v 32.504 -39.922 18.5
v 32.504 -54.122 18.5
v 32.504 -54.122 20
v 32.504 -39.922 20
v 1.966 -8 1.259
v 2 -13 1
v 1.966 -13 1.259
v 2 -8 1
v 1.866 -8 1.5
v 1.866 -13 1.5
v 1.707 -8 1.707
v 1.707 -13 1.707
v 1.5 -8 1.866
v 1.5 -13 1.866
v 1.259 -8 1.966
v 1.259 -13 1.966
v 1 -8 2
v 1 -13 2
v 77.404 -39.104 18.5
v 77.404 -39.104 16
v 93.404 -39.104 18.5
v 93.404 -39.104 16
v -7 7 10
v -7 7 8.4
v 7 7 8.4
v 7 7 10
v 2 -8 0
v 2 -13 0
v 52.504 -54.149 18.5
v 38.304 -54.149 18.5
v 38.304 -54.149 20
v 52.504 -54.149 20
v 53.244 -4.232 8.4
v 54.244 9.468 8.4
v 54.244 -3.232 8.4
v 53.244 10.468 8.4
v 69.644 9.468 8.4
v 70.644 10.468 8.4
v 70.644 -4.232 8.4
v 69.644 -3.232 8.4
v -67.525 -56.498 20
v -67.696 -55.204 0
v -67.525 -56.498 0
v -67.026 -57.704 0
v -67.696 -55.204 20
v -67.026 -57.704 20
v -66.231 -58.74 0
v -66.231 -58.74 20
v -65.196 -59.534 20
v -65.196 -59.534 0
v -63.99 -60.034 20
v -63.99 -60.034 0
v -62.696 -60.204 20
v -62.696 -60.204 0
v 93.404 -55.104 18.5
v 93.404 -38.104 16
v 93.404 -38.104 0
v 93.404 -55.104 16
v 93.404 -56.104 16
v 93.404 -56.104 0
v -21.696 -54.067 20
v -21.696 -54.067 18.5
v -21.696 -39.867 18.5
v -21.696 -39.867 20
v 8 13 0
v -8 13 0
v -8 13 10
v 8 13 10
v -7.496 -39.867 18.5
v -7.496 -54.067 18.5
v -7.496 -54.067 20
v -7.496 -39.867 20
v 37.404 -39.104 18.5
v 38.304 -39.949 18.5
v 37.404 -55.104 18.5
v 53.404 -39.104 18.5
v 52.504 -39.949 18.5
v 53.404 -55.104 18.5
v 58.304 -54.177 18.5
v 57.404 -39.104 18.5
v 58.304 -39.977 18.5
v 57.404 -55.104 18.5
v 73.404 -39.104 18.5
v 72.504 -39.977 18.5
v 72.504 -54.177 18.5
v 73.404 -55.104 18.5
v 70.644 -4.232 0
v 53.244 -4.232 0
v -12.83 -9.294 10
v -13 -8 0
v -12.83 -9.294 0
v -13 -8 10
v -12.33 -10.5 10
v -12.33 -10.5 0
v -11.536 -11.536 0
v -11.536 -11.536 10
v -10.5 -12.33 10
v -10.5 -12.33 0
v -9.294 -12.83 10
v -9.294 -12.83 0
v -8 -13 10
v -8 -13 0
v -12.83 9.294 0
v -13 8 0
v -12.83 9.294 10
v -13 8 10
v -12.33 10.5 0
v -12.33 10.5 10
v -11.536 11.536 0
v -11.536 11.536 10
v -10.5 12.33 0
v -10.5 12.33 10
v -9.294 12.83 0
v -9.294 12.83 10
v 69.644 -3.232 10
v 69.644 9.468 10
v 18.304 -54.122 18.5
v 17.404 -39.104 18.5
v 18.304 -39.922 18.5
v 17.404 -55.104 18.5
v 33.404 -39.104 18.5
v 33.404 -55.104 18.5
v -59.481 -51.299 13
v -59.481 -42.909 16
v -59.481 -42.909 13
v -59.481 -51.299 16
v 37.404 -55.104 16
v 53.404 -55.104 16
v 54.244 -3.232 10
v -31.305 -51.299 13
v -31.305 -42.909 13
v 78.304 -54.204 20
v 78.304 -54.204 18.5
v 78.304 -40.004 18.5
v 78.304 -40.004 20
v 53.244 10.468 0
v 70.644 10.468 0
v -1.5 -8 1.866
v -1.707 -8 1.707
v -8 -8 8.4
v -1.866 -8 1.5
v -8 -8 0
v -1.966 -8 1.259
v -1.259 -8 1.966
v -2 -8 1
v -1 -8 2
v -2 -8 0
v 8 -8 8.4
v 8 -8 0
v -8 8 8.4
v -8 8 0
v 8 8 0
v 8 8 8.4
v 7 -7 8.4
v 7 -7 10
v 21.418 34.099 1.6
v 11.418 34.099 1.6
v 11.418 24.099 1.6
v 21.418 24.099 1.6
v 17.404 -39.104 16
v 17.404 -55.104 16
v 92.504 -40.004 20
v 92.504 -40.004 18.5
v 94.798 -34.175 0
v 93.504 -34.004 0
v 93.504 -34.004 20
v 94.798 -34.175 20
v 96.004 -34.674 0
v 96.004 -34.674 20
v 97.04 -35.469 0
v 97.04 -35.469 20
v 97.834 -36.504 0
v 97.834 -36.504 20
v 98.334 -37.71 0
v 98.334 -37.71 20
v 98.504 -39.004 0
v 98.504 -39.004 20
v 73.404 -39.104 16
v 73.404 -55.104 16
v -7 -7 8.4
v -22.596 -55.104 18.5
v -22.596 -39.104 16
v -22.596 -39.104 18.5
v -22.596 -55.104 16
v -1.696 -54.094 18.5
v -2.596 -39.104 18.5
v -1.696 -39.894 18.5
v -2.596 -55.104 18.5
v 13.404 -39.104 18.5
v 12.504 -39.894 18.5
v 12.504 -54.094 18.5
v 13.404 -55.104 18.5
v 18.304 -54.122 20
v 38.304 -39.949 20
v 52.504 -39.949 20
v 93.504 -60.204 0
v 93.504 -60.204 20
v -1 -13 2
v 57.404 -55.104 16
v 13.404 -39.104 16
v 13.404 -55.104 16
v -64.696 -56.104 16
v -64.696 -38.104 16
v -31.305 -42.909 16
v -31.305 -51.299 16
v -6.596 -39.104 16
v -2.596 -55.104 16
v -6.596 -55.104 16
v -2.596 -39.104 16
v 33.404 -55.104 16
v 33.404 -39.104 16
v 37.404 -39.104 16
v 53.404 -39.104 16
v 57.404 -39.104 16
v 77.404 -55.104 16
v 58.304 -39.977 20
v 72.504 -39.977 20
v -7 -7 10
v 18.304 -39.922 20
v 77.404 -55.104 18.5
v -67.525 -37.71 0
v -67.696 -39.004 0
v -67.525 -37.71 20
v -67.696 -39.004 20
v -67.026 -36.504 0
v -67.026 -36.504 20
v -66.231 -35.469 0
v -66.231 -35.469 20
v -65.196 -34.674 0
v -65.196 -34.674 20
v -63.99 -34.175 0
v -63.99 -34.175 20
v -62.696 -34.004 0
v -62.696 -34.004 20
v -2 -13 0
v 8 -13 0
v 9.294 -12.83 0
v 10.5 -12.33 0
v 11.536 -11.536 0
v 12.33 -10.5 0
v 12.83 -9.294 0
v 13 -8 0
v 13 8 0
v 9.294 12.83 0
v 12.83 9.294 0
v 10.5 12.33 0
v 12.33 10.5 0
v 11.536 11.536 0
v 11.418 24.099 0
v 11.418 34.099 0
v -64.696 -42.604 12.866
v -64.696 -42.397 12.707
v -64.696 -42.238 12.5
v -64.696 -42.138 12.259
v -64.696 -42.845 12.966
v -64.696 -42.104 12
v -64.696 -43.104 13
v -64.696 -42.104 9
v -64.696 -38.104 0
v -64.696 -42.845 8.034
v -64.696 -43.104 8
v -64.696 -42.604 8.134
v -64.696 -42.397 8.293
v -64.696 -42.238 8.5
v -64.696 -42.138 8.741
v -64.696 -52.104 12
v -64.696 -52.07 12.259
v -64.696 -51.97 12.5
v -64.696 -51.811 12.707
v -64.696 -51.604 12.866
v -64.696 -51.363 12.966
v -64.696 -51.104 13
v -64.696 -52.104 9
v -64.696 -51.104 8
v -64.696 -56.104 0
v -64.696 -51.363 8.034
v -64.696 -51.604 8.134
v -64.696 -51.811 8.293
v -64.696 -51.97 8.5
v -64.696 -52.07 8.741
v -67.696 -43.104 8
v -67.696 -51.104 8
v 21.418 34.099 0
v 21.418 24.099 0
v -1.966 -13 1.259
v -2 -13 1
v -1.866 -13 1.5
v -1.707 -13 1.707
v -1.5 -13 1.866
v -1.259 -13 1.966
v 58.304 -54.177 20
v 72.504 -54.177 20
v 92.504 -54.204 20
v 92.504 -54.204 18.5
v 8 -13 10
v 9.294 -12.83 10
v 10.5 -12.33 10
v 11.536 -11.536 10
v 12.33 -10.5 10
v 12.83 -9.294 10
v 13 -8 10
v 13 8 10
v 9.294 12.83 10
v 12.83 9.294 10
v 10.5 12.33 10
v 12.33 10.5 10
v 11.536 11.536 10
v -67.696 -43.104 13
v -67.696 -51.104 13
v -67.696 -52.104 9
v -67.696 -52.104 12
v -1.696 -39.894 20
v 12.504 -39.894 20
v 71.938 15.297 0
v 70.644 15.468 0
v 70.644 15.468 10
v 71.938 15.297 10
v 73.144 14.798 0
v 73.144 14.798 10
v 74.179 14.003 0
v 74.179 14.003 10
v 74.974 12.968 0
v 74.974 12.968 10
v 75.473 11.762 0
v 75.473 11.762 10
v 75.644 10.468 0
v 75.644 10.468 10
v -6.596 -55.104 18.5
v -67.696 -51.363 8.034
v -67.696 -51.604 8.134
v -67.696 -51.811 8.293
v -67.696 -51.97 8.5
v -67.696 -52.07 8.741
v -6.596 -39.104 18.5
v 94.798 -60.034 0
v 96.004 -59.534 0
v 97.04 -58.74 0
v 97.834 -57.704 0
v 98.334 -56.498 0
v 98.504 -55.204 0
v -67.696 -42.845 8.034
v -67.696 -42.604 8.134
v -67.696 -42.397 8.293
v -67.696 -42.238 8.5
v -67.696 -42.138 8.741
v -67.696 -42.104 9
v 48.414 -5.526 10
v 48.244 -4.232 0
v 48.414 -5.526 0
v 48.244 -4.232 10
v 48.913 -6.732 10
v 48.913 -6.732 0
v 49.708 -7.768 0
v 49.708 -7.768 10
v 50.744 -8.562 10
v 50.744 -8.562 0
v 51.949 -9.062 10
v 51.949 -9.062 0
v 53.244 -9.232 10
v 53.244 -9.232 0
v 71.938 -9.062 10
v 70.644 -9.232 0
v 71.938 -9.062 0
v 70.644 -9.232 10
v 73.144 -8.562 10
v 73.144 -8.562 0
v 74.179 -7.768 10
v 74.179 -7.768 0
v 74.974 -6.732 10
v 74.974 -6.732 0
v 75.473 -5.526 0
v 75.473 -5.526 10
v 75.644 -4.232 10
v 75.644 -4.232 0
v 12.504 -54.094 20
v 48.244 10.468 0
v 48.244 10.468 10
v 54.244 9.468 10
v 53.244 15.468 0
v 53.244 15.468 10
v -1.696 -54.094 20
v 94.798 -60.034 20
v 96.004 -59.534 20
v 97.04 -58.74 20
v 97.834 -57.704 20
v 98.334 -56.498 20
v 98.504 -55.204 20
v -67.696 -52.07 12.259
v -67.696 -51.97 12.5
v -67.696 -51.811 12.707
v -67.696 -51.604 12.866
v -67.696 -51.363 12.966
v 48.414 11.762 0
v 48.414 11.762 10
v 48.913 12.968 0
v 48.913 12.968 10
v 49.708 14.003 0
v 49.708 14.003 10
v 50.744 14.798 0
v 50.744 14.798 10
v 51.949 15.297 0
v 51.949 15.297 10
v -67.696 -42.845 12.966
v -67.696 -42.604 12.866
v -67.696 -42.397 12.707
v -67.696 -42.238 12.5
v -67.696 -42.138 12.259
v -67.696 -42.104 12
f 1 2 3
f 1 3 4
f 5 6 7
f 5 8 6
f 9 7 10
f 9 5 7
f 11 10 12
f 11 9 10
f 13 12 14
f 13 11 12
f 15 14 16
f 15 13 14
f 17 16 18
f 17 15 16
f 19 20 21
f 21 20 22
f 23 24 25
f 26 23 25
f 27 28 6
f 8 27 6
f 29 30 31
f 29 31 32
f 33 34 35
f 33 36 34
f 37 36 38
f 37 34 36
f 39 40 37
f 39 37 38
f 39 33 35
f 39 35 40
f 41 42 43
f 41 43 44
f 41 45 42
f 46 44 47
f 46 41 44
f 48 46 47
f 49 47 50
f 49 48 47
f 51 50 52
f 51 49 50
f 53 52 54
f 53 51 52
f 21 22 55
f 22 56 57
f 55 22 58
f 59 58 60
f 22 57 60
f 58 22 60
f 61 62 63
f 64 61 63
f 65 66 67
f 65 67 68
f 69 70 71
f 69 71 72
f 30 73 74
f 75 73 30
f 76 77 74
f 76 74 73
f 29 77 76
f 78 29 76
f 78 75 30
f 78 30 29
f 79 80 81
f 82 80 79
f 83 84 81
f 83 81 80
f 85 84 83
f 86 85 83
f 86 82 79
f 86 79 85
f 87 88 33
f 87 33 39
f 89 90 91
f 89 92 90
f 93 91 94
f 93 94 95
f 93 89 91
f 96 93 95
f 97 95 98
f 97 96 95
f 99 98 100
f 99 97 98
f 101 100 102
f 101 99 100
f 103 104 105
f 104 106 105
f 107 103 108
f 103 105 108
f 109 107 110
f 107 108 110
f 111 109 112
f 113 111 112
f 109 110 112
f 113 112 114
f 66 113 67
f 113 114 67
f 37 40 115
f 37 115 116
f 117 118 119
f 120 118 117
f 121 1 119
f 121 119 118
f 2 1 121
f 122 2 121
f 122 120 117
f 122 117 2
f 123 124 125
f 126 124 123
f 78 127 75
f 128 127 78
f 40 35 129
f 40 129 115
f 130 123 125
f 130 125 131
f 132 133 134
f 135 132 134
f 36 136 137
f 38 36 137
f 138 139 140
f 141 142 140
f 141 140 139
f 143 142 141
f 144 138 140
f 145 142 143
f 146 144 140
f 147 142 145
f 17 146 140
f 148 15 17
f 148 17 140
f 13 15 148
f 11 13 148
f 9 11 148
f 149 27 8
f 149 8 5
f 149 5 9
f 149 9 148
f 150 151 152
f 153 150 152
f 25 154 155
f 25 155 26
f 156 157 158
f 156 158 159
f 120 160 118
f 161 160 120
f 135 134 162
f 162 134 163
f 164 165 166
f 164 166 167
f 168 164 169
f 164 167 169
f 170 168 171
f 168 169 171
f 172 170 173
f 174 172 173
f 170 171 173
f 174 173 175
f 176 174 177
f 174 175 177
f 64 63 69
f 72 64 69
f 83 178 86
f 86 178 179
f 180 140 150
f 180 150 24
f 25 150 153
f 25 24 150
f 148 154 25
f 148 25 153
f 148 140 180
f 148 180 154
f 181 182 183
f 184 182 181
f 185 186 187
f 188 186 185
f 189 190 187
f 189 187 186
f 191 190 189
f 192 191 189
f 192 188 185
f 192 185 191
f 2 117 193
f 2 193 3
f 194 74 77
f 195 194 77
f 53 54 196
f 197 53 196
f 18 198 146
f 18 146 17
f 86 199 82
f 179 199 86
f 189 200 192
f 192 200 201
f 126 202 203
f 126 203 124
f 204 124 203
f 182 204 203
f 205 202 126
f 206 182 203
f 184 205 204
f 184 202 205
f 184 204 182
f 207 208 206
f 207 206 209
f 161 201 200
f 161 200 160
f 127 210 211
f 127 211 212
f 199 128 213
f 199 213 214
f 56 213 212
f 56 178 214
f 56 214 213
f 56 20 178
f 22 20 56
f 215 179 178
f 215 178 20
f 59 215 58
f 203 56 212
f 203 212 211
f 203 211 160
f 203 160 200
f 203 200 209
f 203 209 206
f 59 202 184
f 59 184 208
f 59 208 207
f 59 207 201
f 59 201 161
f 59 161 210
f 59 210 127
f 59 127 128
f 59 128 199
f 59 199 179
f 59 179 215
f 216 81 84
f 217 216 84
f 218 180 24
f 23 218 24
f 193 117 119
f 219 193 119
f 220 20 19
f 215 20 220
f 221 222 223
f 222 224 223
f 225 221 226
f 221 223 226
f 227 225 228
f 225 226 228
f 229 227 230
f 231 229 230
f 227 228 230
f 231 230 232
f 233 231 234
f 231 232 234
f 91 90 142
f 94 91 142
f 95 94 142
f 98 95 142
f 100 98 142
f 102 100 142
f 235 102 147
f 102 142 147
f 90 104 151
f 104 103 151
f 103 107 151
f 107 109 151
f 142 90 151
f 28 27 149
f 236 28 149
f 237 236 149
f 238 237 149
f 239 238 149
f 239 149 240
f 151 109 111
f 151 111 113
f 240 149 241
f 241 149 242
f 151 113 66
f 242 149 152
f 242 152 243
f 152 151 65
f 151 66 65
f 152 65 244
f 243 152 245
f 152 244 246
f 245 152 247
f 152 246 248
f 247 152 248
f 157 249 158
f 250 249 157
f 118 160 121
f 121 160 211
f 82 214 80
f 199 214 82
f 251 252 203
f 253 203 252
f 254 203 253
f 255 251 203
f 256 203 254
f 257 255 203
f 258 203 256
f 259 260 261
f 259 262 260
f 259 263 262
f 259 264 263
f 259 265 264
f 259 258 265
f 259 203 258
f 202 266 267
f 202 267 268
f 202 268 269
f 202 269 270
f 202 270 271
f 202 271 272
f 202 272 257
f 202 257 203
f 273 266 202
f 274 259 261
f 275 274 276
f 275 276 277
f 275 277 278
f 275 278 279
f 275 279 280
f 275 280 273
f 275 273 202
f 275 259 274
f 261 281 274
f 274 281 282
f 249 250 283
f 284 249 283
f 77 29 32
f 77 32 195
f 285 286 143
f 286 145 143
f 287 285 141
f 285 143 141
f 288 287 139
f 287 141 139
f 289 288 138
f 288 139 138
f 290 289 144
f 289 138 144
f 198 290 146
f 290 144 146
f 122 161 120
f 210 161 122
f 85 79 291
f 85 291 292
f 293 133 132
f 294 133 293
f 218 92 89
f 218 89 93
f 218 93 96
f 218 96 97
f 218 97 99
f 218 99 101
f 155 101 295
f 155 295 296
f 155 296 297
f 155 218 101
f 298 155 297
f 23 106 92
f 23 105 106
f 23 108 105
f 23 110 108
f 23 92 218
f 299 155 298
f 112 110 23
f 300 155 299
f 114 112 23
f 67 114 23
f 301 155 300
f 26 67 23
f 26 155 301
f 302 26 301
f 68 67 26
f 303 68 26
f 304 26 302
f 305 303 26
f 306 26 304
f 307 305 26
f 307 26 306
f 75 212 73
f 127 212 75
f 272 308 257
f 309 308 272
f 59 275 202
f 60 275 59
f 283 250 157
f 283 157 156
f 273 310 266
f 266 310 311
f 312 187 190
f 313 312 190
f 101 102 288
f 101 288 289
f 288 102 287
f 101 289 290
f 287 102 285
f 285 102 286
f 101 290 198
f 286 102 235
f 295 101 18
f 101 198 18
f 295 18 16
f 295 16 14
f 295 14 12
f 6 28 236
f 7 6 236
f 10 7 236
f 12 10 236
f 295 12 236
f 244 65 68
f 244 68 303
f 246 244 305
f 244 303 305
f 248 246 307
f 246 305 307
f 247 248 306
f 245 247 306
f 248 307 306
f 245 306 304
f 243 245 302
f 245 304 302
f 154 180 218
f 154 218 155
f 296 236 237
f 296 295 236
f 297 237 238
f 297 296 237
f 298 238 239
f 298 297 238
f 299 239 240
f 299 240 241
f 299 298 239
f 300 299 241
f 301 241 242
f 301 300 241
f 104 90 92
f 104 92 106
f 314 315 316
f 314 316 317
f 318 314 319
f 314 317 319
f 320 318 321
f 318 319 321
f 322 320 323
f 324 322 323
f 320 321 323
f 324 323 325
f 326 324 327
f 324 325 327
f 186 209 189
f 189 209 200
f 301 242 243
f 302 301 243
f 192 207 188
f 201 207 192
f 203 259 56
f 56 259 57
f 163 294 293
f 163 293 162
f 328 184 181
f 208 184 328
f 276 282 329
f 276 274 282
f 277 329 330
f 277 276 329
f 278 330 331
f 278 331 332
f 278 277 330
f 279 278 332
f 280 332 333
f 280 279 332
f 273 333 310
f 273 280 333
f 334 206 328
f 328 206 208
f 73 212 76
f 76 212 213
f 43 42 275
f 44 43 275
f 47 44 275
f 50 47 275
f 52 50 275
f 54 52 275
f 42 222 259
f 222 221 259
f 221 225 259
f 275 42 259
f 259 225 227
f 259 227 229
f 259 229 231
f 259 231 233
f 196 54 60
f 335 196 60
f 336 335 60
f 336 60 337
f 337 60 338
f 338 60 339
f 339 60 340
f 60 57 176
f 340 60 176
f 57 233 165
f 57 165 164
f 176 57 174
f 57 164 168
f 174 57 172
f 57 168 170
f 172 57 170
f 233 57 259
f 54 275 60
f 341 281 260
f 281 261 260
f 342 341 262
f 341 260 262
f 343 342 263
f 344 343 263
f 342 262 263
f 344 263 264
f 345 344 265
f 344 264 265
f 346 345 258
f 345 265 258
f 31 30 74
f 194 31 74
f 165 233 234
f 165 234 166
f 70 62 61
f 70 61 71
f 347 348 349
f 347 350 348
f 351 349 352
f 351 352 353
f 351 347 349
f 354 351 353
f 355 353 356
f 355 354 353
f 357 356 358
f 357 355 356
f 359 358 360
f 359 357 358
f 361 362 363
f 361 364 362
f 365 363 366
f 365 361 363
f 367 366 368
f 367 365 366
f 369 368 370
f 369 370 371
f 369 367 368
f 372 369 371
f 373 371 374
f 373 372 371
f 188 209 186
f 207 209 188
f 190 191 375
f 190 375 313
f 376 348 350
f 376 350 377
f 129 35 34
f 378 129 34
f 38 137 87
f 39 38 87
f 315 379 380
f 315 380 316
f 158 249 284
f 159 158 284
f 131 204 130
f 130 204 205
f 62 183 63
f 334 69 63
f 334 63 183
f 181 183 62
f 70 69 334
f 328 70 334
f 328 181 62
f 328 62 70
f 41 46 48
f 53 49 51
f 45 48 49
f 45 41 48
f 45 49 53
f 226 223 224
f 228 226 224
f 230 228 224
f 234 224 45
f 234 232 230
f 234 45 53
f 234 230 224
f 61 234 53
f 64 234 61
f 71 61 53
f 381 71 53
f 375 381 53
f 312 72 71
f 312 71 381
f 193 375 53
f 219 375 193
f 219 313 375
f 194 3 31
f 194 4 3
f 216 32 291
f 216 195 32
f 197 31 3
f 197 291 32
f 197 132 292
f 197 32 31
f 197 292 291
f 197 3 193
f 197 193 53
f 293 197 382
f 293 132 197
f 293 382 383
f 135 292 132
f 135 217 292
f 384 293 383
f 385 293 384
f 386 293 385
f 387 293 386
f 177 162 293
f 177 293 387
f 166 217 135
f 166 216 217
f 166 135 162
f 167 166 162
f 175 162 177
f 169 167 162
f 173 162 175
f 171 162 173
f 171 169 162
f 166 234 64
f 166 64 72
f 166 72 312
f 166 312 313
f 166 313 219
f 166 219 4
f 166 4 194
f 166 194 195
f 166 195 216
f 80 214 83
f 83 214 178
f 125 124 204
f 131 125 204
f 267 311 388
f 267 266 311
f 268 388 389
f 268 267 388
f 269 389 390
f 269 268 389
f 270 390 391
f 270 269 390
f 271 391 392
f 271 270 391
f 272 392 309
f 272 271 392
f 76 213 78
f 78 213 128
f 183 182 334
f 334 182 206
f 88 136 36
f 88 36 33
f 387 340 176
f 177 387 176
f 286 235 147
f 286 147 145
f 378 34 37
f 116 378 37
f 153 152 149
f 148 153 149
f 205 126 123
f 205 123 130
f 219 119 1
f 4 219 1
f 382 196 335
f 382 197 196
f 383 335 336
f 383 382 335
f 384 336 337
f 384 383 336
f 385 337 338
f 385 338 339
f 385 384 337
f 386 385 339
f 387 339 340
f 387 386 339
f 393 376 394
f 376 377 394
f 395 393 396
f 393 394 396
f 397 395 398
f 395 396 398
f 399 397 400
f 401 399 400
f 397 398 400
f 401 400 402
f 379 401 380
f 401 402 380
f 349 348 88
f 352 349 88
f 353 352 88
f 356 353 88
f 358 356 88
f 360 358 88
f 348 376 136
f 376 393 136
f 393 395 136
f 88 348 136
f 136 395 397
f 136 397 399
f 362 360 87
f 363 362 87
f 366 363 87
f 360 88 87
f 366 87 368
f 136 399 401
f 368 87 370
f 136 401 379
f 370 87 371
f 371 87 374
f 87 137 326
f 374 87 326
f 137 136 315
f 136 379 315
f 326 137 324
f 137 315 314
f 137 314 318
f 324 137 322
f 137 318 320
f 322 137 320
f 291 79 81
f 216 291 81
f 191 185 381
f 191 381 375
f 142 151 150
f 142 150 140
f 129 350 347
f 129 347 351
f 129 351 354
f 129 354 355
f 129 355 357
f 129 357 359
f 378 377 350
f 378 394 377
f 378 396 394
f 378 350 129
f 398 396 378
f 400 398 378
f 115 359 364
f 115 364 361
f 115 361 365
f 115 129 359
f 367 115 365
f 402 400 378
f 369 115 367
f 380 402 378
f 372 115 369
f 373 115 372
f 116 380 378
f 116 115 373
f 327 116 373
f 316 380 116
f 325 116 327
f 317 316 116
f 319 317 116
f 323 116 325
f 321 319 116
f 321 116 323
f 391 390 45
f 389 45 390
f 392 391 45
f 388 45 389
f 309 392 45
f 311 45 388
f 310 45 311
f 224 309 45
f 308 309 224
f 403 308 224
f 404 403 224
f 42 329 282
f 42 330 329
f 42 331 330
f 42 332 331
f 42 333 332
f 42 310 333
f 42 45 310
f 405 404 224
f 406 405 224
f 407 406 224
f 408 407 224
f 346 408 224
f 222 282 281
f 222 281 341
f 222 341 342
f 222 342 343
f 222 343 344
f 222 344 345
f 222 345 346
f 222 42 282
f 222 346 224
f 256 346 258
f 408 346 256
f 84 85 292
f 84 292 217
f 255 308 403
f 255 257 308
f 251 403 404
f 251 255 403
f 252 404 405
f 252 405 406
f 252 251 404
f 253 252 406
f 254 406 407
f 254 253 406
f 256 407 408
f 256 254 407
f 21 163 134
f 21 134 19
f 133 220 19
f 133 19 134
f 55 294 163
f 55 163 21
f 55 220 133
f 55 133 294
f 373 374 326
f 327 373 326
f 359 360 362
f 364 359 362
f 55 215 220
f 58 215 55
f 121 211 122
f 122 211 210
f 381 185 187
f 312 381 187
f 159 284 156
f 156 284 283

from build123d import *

# Parameters (mm, degrees)
F0_W      = 26
F0_H      = 26
F0_W_2    = 14
F0_H_2    = 14
F0_W_3    = 27.4
F0_H_3    = 24.7
F0_W_4    = 15.4
F0_H_4    = 12.7
F1_DEPTH  = 10
F2_W      = 16
F2_H      = 16
F2_W_2    = 17.4
F2_H_2    = 14.7
F3_DEPTH  = 8.4
F4_W      = 4
F4_H      = 4
F5_DEPTH  = 5
F6_W      = 166.199906
F6_H      = 26.2
F6_W_2    = 14.2
F6_H_2    = 14.2
F7_DEPTH  = 20
F8_W      = 16
F8_H      = 16
F9_DEPTH  = 18.5
F10_W     = 158.099906
F10_H     = 18
F11_DEPTH = 16
F12_W     = 28.1763
F12_H     = 8.38993
F13_DEPTH = 3
F14_W     = 10
F14_H     = 5
F15_DEPTH = 3
F16_R     = 5
F16_2_R   = 5
F17_R     = 1
F17_2_R   = 1
F18_W     = 10
F18_H     = 10
F19_DEPTH = 1.6


with BuildPart() as f1:
    # F0 (on Top) → F1 (new body)
    with BuildSketch(Plane.XY):
        Rectangle(F0_W, F0_H)
        Rectangle(F0_W_2, F0_H_2, mode=Mode.SUBTRACT)
        with Locations((61.943563, 3.11776)):
            Rectangle(F0_W_3, F0_H_3)
        with Locations((61.943563, 3.11776)):
            Rectangle(F0_W_4, F0_H_4, mode=Mode.SUBTRACT)
    extrude(amount=F1_DEPTH)

    # F2 (on face) → F3 (cut)
    with BuildSketch(Plane(origin=(0, 0, 0), x_dir=(1, 0, 0), z_dir=(0, 0, -1))):
        Rectangle(F2_W, F2_H)
        with Locations((61.943563, -3.11776)):
            Rectangle(F2_W_2, F2_H_2)
    extrude(amount=-F3_DEPTH, mode=Mode.SUBTRACT)

    # F4 (on face) → F5 (cut, through all)
    with BuildSketch(Plane.XZ.offset(13)):
        Rectangle(F4_W, F4_H)
    extrude(amount=-F5_DEPTH, mode=Mode.SUBTRACT)

    # F16
    f16_edges = [f1.edges().sort_by_distance(p)[0] for p in [
        (-13, -13, 5),
        (-13, 13, 5),
        (13, -13, 5),
        (13, 13, 5),
        (75.643563, 15.46776, 5),
        (75.643563, -9.23224, 5),
        (48.243563, -9.23224, 5),
        (48.243563, 15.46776, 5),
    ]]
    fillet(f16_edges, radius=F16_R)

    # F17
    f17_edges = [f1.edges().sort_by_distance(p)[0] for p in [
        (-2, -10.5, 2),
        (2, -10.5, 2),
    ]]
    fillet(f17_edges, radius=F17_R)


with BuildPart() as f7:
    # F6 (on Top) → F7 (new body)
    with BuildSketch(Plane.XY):
        with Locations((15.404408, -47.104196)):
            Rectangle(F6_W, F6_H)
        with Locations((-14.595545, -46.966988)):
            Rectangle(F6_W_2, F6_H_2, mode=Mode.SUBTRACT)
        with Locations((5.404436, -46.99443)):
            Rectangle(F6_W_2, F6_H_2, mode=Mode.SUBTRACT)
        with Locations((25.404418, -47.021871)):
            Rectangle(F6_W_2, F6_H_2, mode=Mode.SUBTRACT)
        with Locations((45.404399, -47.049313)):
            Rectangle(F6_W_2, F6_H_2, mode=Mode.SUBTRACT)
        with Locations((65.40438, -47.076754)):
            Rectangle(F6_W_2, F6_H_2, mode=Mode.SUBTRACT)
        with Locations((85.404361, -47.104196)):
            Rectangle(F6_W_2, F6_H_2, mode=Mode.SUBTRACT)
    extrude(amount=F7_DEPTH)

    # F8 (on face) → F9 (cut)
    with BuildSketch(Plane(origin=(0, 0, 0), x_dir=(1, 0, 0), z_dir=(0, 0, -1))):
        with Locations((85.404361, 47.104196)):
            Rectangle(F8_W, F8_H)
        with Locations((65.404361, 47.104196)):
            Rectangle(F8_W, F8_H)
        with Locations((45.404361, 47.104196)):
            Rectangle(F8_W, F8_H)
        with Locations((25.404361, 47.104196)):
            Rectangle(F8_W, F8_H)
        with Locations((5.404361, 47.104196)):
            Rectangle(F8_W, F8_H)
        with Locations((-14.595639, 47.104196)):
            Rectangle(F8_W, F8_H)
    extrude(amount=-F9_DEPTH, mode=Mode.SUBTRACT)

    # F10 (on face) → F11 (cut)
    with BuildSketch(Plane(origin=(0, 0, 0), x_dir=(1, 0, 0), z_dir=(0, 0, -1))):
        with Locations((14.354408, 47.104196)):
            Rectangle(F10_W, F10_H)
    extrude(amount=-F11_DEPTH, mode=Mode.SUBTRACT)

    # F12 (on face) → F13 (join)
    with BuildSketch(Plane(origin=(0, 0, 16), x_dir=(1, 0, 0), z_dir=(0, 0, -1))):
        with Locations((-45.393016, 47.104196)):
            Rectangle(F12_W, F12_H)
    extrude(amount=F13_DEPTH)

    # F14 (on face) → F15 (cut, through all)
    with BuildSketch(Plane(origin=(-67.695545, 0, 0), x_dir=(0, -1, 0), z_dir=(-1, 0, 0))):
        with Locations((47.104196, 10.5)):
            Rectangle(F14_W, F14_H)
    extrude(amount=-F15_DEPTH, mode=Mode.SUBTRACT)

    # F16#2
    f16_2_edges = [f7.edges().sort_by_distance(p)[0] for p in [
        (-67.695545, -34.004196, 10),
        (-67.695545, -60.204196, 10),
        (98.504361, -60.204196, 10),
        (98.504361, -34.004196, 10),
    ]]
    fillet(f16_2_edges, radius=F16_2_R)

    # F17#2
    f17_2_edges = [f7.edges().sort_by_distance(p)[0] for p in [
        (-66.195545, -42.104196, 13),
        (-66.195545, -52.104196, 13),
        (-66.195545, -42.104196, 8),
        (-66.195545, -52.104196, 8),
    ]]
    fillet(f17_2_edges, radius=F17_2_R)


with BuildPart() as f19:
    # F18 (on Top) → F19 (new body)
    with BuildSketch(Plane.XY):
        with Locations((16.418241, 29.098614)):
            Rectangle(F18_W, F18_H)
    extrude(amount=F19_DEPTH)


solid = Compound([f1.part, f7.part, f19.part])
